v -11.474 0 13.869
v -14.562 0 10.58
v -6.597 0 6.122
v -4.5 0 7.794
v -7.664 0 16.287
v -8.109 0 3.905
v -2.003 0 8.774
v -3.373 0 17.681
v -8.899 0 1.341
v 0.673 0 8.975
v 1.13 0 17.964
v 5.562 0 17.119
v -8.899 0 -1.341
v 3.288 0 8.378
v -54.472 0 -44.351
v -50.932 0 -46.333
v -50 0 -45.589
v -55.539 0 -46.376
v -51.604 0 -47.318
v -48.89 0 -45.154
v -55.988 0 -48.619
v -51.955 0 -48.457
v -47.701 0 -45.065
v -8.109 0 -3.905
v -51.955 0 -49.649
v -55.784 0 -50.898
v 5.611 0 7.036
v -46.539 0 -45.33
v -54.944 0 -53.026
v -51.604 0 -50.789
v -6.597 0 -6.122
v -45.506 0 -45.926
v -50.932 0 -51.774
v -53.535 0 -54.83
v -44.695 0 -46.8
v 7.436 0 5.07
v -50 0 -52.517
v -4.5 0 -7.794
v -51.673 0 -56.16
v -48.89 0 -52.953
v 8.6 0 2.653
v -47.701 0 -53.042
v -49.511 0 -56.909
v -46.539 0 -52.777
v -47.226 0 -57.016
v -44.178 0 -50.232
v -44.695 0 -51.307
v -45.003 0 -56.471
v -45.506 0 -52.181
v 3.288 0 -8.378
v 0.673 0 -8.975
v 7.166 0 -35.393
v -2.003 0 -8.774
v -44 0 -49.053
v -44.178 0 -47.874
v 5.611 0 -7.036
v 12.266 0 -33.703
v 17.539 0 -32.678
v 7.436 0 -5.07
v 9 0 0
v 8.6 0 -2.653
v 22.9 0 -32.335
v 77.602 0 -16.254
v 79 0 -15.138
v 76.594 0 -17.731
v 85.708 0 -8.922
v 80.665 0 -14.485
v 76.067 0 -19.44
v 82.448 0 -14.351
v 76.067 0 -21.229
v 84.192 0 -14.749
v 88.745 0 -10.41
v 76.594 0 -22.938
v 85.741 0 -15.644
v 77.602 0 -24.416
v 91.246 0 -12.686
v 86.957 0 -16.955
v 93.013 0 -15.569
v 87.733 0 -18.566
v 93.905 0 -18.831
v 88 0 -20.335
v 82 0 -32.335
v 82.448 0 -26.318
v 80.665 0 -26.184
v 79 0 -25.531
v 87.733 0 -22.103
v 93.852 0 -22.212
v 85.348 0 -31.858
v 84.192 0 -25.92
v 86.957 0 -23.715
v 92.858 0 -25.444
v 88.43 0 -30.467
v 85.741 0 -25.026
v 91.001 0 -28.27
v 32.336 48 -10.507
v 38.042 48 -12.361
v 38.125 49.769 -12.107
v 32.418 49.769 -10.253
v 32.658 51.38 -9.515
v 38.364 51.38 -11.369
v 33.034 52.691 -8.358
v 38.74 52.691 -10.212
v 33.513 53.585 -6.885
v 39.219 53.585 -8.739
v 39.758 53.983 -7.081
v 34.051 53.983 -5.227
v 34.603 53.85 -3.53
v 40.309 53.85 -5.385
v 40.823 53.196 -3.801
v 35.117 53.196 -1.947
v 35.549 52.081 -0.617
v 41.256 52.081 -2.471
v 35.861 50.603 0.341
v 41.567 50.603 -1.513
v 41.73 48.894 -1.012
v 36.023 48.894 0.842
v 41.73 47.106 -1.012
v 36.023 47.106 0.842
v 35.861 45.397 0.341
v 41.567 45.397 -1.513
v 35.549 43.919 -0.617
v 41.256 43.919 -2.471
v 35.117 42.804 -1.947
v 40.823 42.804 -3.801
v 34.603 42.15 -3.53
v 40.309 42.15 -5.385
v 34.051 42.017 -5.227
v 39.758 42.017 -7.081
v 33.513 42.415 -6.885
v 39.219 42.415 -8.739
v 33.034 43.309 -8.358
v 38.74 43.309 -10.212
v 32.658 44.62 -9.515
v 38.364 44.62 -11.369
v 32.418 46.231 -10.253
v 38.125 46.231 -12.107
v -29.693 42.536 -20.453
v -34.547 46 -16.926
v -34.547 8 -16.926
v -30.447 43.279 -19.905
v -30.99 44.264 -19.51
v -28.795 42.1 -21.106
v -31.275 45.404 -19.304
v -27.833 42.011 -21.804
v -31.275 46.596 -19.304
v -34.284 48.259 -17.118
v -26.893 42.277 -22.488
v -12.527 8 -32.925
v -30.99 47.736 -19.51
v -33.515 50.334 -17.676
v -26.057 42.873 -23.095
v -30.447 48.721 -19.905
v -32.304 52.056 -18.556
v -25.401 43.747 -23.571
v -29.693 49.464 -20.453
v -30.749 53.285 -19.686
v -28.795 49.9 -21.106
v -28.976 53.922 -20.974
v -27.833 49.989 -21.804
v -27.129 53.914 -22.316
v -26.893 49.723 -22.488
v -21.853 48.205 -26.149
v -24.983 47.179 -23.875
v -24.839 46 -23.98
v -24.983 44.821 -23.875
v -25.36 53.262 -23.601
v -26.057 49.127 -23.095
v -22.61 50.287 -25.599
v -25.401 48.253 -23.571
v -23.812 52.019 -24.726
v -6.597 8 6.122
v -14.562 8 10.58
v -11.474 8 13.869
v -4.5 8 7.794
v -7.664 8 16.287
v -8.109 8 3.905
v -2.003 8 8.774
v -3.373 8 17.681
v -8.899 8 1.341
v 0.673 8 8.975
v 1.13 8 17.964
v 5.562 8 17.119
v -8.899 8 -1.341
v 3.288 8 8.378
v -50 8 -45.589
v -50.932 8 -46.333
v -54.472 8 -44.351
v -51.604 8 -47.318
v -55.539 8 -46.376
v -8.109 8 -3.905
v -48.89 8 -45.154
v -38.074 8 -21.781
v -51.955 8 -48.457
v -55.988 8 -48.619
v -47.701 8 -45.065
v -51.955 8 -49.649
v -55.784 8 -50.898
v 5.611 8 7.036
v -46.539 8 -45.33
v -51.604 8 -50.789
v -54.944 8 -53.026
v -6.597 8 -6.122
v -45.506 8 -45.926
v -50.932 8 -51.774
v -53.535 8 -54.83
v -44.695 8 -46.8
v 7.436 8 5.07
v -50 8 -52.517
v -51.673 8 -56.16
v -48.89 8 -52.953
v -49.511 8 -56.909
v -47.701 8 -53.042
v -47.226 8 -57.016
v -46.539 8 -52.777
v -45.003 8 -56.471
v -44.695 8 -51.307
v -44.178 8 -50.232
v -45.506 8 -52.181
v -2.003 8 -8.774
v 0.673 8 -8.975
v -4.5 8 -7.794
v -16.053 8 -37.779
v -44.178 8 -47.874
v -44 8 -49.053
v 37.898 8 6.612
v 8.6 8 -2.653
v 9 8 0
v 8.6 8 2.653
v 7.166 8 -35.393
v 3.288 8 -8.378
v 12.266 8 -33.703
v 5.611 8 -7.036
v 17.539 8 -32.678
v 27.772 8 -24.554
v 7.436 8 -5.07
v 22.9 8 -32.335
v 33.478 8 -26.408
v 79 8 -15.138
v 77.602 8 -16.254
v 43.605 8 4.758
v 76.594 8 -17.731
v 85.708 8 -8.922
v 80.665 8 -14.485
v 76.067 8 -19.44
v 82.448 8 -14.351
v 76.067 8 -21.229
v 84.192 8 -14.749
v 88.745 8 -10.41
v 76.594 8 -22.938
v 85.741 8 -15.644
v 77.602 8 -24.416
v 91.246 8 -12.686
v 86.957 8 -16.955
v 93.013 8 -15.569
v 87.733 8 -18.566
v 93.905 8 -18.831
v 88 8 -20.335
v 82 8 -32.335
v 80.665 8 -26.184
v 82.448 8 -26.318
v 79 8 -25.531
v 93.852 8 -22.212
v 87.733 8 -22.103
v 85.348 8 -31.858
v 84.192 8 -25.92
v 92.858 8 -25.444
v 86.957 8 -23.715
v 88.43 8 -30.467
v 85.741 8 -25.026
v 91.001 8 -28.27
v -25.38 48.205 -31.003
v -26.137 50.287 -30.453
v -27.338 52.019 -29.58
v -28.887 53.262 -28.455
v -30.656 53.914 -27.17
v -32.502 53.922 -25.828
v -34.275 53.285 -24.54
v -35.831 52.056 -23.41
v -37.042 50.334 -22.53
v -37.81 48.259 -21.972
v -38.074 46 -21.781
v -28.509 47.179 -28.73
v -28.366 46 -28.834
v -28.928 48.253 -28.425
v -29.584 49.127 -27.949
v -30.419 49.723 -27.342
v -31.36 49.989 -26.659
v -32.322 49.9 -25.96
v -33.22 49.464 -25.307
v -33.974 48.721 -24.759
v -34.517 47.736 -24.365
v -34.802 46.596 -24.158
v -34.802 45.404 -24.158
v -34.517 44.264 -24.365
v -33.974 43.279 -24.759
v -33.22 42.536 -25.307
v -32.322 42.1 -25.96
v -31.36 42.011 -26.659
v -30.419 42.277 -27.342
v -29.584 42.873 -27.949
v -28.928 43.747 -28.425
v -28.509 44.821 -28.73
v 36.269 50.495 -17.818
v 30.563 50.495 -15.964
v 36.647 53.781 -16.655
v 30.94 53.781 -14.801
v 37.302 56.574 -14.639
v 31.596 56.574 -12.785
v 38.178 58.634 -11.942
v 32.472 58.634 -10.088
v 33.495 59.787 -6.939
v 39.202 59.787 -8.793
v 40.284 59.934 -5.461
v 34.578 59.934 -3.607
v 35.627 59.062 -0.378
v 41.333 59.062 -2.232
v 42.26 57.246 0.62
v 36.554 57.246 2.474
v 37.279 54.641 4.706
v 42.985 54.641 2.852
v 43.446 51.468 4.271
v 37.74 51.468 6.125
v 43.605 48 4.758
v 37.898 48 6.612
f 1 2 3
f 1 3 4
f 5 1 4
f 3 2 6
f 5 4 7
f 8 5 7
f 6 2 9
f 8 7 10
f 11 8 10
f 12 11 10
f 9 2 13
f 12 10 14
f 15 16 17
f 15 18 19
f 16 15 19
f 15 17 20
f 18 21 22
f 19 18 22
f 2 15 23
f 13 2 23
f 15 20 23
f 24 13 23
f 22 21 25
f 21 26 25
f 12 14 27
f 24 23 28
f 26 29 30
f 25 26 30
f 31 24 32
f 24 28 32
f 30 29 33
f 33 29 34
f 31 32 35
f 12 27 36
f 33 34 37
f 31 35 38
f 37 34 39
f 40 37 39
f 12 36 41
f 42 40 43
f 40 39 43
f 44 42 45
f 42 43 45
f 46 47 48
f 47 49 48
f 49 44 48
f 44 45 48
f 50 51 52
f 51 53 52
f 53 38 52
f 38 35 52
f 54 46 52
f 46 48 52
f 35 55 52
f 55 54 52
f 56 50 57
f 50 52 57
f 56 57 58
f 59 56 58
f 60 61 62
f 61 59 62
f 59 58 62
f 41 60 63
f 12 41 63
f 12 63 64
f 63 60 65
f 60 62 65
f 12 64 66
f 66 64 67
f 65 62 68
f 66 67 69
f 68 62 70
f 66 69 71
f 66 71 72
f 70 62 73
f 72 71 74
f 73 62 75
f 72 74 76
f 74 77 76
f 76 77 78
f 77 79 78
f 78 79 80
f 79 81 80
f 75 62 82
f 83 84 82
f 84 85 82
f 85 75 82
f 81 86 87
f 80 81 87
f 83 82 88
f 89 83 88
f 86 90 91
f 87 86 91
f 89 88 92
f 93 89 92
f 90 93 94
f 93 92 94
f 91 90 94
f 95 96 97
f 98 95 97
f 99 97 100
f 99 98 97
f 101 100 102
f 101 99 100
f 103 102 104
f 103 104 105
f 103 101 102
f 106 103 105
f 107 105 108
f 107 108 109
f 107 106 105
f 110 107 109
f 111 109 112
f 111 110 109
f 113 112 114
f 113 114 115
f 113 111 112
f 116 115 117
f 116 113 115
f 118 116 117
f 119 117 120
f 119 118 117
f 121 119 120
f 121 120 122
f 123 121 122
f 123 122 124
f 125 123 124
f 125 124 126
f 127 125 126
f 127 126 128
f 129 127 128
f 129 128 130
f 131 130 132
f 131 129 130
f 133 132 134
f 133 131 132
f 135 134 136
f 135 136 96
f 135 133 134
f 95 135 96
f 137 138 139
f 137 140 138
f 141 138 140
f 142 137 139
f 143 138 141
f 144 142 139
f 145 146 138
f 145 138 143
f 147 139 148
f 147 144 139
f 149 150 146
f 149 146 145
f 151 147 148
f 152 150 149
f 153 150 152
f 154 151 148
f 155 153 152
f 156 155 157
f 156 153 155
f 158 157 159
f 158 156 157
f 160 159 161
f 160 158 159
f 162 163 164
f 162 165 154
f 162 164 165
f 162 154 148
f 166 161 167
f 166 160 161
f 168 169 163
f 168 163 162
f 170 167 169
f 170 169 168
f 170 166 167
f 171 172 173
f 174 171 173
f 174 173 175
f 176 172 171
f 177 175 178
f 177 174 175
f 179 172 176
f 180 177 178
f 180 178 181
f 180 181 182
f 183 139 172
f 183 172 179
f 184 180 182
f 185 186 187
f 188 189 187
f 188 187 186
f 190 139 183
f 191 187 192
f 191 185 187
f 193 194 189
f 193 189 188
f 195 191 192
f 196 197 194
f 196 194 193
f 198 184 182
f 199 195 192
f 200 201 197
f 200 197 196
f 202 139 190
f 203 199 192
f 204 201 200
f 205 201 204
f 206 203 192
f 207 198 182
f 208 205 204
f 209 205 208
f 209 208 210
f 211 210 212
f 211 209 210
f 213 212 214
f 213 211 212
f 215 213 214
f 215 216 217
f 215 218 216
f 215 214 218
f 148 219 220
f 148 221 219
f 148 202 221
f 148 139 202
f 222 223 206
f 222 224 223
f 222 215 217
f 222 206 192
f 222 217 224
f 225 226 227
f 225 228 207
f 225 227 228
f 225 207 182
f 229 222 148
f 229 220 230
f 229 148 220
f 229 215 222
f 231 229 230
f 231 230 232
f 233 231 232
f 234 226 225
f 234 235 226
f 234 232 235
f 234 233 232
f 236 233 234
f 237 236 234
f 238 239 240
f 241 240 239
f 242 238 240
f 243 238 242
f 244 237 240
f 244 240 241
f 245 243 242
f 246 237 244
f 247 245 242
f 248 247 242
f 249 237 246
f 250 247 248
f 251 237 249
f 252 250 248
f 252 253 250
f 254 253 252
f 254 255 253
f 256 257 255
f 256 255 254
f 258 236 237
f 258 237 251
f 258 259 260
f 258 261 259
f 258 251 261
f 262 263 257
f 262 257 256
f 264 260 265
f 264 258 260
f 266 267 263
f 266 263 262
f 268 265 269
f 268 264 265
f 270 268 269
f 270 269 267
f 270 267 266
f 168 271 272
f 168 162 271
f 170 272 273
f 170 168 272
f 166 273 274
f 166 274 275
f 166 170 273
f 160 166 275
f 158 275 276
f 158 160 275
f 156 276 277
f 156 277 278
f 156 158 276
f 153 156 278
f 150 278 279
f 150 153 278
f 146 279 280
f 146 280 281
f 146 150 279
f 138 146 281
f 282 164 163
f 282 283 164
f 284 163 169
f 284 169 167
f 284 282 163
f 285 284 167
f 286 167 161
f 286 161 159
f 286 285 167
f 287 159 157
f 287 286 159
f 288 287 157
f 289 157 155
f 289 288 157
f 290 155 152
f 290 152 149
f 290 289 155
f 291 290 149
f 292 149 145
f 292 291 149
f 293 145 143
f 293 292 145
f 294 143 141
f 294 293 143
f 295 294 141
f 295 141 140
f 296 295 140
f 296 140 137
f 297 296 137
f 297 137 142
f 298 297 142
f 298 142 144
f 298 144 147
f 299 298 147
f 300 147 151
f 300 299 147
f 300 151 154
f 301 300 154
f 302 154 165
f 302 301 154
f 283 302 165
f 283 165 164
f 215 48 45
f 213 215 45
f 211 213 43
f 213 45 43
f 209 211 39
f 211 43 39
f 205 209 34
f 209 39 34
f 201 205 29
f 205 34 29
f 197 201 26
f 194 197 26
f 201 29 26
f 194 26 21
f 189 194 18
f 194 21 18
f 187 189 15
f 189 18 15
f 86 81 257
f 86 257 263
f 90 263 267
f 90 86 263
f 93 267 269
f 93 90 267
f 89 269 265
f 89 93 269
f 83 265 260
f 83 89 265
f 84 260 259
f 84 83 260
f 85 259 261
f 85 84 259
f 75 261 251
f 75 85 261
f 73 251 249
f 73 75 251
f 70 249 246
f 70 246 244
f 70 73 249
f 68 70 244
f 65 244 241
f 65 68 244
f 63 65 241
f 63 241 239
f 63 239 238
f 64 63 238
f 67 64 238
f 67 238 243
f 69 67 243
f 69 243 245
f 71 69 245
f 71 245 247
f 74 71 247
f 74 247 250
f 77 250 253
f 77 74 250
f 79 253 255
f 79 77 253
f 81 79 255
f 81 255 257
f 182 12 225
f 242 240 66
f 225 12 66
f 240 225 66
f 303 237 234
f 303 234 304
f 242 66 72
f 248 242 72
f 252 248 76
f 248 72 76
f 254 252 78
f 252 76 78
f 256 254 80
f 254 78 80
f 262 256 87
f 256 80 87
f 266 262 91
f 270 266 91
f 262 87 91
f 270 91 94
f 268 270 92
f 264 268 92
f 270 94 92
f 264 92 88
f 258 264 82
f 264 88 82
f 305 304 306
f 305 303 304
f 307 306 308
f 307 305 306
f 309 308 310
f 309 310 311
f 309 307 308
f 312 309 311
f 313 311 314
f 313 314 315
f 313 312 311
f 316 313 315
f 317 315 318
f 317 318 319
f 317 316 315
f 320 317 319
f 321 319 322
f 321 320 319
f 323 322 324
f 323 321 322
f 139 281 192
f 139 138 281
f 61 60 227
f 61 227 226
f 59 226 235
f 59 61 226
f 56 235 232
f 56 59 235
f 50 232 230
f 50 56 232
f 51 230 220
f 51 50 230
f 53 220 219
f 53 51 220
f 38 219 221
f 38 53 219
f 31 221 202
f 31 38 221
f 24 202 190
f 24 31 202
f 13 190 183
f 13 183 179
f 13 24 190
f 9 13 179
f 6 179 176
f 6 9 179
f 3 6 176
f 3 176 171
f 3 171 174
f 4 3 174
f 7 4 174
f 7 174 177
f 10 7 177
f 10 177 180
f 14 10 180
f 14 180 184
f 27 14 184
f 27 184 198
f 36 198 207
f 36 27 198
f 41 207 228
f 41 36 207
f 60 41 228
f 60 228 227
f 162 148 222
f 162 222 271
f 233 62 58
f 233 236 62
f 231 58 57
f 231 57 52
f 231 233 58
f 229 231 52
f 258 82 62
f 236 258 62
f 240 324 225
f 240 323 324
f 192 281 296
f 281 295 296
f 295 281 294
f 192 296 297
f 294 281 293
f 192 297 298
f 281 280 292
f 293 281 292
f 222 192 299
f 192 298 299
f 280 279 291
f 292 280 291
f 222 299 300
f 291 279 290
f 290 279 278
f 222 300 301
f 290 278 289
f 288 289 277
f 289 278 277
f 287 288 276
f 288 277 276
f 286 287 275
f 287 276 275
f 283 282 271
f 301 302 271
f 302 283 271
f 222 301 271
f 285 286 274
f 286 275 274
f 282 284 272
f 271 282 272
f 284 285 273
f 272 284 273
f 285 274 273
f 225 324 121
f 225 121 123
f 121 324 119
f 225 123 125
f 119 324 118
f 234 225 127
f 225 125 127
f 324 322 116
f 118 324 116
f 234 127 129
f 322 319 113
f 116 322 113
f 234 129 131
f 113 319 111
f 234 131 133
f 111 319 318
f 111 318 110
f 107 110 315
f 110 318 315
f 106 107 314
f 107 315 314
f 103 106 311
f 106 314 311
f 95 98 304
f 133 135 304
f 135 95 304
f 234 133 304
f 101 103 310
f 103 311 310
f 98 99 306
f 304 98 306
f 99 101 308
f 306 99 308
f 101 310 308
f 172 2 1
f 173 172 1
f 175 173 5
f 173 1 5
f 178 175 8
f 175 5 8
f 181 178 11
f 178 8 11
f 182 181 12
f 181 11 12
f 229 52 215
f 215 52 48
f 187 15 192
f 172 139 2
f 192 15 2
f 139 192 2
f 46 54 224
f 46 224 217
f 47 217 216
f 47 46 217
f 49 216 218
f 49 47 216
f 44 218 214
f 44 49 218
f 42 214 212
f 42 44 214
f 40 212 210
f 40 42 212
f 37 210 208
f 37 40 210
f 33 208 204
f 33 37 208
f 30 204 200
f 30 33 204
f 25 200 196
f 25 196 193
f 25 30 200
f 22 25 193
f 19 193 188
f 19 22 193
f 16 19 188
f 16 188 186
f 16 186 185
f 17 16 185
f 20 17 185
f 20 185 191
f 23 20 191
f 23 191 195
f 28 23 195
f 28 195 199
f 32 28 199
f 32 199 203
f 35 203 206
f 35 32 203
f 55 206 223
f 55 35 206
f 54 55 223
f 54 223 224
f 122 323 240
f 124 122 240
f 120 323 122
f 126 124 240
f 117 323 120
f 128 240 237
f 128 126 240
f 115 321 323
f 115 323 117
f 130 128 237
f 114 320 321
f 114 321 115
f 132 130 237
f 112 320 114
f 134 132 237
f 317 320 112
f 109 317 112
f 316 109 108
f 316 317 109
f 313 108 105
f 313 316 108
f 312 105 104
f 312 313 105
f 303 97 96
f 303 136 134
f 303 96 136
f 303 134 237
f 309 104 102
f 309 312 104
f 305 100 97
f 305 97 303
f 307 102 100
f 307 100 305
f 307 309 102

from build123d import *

# Parameters (mm, degrees)
SKETCH1_R           = 9
SKETCH1_R_2         = 6
SKETCH1_R_3         = 4
BOSS_EXTRUDE1_DEPTH = 8
SKETCH3_R           = 8
SKETCH3_R_2         = 4
BOSS_EXTRUDE2_DEPTH = 3
SKETCH5_R           = 12
SKETCH5_R_2         = 6
BOSS_EXTRUDE3_DEPTH = 3
FILLET1_R           = 42


with BuildPart() as part:
    # Sketch1 → Boss-Extrude1 (new body)
    with BuildSketch(Plane(origin=(0, 0, 0), x_dir=(1, 0, 0), z_dir=(0, 1, 0))):
        with BuildLine():
            Line((82, 32.334641746), (14.735908192, 32.334641746))
            Line((14.735908192, 32.334641746), (-45.003147253, 56.470786852))
            ThreePointArc((-45.003147253, 56.470786852), (-54.304086029, 53.978607818), (-54.472135955, 44.351033997))
            Line((-54.472135955, 44.351033997), (-14.562305899, -10.580134541))
            ThreePointArc((-14.562305899, -10.580134541), (-5.562305899, -17.119017293), (5.562305899, -17.119017293))
            Line((5.562305899, -17.119017293), (85.708203932, 8.92196355))
            ThreePointArc((85.708203932, 8.92196355), (93.852260087, 22.211855326), (82, 32.334641746))
        make_face()
        Circle(SKETCH1_R, mode=Mode.SUBTRACT)
        with Locations((82, 20.334641746)):
            Circle(SKETCH1_R_2, mode=Mode.SUBTRACT)
        with Locations((-48, 49.053316016)):
            Circle(SKETCH1_R_3, mode=Mode.SUBTRACT)
    extrude(amount=BOSS_EXTRUDE1_DEPTH)

    # Sketch3 → Boss-Extrude2 (add, symmetric)
    with BuildSketch(Plane(origin=(-21.748054335, 0, -29.933628792), x_dir=(0.809016994, 0, -0.587785252), z_dir=(0.587785252, 0, 0.809016994))):
        with BuildLine():
            Line((-18, 46), (-18, 8))
            Line((-18, 8), (9.218720146, 8))
            Line((9.218720146, 8), (-2.309906432, 48.205098847))
            ThreePointArc((-2.309906432, 48.205098847), (-2.07785545, 47.113384808), (-2, 46))
            ThreePointArc((-2, 46), (-10, 38), (-18, 46))
        make_face()
        with Locations((-10, 46)):
            Circle(SKETCH3_R)
        with Locations((-10, 46)):
            Circle(SKETCH3_R_2, mode=Mode.SUBTRACT)
    extrude(amount=BOSS_EXTRUDE2_DEPTH, both=True)

    # Sketch5 → Boss-Extrude3 (add, symmetric)
    with BuildSketch(Plane(origin=(35.189091103, 0, -11.433628792), x_dir=(-0.309016994, 0, -0.951056516), z_dir=(0.951056516, 0, -0.309016994))):
        with BuildLine():
            Line((-18, 48), (-18, 8))
            Line((-18, 8), (14.770349605, 8))
            Line((14.770349605, 8), (5.737771209, 50.49494029))
            ThreePointArc((5.737771209, 50.49494029), (5.934262744, 49.254341559), (6, 48))
            ThreePointArc((6, 48), (-6, 36), (-18, 48))
        make_face()
        with Locations((-6, 48)):
            Circle(SKETCH5_R)
        with Locations((-6, 48)):
            Circle(SKETCH5_R_2, mode=Mode.SUBTRACT)
    extrude(amount=BOSS_EXTRUDE3_DEPTH, both=True)

    # Fillet1
    fillet1_edges = [part.edges().sort_by_distance(p)[0] for p in [
        (14.735908192, 4, -32.334641746),
    ]]
    fillet(fillet1_edges, radius=FILLET1_R)


solid = part.part
